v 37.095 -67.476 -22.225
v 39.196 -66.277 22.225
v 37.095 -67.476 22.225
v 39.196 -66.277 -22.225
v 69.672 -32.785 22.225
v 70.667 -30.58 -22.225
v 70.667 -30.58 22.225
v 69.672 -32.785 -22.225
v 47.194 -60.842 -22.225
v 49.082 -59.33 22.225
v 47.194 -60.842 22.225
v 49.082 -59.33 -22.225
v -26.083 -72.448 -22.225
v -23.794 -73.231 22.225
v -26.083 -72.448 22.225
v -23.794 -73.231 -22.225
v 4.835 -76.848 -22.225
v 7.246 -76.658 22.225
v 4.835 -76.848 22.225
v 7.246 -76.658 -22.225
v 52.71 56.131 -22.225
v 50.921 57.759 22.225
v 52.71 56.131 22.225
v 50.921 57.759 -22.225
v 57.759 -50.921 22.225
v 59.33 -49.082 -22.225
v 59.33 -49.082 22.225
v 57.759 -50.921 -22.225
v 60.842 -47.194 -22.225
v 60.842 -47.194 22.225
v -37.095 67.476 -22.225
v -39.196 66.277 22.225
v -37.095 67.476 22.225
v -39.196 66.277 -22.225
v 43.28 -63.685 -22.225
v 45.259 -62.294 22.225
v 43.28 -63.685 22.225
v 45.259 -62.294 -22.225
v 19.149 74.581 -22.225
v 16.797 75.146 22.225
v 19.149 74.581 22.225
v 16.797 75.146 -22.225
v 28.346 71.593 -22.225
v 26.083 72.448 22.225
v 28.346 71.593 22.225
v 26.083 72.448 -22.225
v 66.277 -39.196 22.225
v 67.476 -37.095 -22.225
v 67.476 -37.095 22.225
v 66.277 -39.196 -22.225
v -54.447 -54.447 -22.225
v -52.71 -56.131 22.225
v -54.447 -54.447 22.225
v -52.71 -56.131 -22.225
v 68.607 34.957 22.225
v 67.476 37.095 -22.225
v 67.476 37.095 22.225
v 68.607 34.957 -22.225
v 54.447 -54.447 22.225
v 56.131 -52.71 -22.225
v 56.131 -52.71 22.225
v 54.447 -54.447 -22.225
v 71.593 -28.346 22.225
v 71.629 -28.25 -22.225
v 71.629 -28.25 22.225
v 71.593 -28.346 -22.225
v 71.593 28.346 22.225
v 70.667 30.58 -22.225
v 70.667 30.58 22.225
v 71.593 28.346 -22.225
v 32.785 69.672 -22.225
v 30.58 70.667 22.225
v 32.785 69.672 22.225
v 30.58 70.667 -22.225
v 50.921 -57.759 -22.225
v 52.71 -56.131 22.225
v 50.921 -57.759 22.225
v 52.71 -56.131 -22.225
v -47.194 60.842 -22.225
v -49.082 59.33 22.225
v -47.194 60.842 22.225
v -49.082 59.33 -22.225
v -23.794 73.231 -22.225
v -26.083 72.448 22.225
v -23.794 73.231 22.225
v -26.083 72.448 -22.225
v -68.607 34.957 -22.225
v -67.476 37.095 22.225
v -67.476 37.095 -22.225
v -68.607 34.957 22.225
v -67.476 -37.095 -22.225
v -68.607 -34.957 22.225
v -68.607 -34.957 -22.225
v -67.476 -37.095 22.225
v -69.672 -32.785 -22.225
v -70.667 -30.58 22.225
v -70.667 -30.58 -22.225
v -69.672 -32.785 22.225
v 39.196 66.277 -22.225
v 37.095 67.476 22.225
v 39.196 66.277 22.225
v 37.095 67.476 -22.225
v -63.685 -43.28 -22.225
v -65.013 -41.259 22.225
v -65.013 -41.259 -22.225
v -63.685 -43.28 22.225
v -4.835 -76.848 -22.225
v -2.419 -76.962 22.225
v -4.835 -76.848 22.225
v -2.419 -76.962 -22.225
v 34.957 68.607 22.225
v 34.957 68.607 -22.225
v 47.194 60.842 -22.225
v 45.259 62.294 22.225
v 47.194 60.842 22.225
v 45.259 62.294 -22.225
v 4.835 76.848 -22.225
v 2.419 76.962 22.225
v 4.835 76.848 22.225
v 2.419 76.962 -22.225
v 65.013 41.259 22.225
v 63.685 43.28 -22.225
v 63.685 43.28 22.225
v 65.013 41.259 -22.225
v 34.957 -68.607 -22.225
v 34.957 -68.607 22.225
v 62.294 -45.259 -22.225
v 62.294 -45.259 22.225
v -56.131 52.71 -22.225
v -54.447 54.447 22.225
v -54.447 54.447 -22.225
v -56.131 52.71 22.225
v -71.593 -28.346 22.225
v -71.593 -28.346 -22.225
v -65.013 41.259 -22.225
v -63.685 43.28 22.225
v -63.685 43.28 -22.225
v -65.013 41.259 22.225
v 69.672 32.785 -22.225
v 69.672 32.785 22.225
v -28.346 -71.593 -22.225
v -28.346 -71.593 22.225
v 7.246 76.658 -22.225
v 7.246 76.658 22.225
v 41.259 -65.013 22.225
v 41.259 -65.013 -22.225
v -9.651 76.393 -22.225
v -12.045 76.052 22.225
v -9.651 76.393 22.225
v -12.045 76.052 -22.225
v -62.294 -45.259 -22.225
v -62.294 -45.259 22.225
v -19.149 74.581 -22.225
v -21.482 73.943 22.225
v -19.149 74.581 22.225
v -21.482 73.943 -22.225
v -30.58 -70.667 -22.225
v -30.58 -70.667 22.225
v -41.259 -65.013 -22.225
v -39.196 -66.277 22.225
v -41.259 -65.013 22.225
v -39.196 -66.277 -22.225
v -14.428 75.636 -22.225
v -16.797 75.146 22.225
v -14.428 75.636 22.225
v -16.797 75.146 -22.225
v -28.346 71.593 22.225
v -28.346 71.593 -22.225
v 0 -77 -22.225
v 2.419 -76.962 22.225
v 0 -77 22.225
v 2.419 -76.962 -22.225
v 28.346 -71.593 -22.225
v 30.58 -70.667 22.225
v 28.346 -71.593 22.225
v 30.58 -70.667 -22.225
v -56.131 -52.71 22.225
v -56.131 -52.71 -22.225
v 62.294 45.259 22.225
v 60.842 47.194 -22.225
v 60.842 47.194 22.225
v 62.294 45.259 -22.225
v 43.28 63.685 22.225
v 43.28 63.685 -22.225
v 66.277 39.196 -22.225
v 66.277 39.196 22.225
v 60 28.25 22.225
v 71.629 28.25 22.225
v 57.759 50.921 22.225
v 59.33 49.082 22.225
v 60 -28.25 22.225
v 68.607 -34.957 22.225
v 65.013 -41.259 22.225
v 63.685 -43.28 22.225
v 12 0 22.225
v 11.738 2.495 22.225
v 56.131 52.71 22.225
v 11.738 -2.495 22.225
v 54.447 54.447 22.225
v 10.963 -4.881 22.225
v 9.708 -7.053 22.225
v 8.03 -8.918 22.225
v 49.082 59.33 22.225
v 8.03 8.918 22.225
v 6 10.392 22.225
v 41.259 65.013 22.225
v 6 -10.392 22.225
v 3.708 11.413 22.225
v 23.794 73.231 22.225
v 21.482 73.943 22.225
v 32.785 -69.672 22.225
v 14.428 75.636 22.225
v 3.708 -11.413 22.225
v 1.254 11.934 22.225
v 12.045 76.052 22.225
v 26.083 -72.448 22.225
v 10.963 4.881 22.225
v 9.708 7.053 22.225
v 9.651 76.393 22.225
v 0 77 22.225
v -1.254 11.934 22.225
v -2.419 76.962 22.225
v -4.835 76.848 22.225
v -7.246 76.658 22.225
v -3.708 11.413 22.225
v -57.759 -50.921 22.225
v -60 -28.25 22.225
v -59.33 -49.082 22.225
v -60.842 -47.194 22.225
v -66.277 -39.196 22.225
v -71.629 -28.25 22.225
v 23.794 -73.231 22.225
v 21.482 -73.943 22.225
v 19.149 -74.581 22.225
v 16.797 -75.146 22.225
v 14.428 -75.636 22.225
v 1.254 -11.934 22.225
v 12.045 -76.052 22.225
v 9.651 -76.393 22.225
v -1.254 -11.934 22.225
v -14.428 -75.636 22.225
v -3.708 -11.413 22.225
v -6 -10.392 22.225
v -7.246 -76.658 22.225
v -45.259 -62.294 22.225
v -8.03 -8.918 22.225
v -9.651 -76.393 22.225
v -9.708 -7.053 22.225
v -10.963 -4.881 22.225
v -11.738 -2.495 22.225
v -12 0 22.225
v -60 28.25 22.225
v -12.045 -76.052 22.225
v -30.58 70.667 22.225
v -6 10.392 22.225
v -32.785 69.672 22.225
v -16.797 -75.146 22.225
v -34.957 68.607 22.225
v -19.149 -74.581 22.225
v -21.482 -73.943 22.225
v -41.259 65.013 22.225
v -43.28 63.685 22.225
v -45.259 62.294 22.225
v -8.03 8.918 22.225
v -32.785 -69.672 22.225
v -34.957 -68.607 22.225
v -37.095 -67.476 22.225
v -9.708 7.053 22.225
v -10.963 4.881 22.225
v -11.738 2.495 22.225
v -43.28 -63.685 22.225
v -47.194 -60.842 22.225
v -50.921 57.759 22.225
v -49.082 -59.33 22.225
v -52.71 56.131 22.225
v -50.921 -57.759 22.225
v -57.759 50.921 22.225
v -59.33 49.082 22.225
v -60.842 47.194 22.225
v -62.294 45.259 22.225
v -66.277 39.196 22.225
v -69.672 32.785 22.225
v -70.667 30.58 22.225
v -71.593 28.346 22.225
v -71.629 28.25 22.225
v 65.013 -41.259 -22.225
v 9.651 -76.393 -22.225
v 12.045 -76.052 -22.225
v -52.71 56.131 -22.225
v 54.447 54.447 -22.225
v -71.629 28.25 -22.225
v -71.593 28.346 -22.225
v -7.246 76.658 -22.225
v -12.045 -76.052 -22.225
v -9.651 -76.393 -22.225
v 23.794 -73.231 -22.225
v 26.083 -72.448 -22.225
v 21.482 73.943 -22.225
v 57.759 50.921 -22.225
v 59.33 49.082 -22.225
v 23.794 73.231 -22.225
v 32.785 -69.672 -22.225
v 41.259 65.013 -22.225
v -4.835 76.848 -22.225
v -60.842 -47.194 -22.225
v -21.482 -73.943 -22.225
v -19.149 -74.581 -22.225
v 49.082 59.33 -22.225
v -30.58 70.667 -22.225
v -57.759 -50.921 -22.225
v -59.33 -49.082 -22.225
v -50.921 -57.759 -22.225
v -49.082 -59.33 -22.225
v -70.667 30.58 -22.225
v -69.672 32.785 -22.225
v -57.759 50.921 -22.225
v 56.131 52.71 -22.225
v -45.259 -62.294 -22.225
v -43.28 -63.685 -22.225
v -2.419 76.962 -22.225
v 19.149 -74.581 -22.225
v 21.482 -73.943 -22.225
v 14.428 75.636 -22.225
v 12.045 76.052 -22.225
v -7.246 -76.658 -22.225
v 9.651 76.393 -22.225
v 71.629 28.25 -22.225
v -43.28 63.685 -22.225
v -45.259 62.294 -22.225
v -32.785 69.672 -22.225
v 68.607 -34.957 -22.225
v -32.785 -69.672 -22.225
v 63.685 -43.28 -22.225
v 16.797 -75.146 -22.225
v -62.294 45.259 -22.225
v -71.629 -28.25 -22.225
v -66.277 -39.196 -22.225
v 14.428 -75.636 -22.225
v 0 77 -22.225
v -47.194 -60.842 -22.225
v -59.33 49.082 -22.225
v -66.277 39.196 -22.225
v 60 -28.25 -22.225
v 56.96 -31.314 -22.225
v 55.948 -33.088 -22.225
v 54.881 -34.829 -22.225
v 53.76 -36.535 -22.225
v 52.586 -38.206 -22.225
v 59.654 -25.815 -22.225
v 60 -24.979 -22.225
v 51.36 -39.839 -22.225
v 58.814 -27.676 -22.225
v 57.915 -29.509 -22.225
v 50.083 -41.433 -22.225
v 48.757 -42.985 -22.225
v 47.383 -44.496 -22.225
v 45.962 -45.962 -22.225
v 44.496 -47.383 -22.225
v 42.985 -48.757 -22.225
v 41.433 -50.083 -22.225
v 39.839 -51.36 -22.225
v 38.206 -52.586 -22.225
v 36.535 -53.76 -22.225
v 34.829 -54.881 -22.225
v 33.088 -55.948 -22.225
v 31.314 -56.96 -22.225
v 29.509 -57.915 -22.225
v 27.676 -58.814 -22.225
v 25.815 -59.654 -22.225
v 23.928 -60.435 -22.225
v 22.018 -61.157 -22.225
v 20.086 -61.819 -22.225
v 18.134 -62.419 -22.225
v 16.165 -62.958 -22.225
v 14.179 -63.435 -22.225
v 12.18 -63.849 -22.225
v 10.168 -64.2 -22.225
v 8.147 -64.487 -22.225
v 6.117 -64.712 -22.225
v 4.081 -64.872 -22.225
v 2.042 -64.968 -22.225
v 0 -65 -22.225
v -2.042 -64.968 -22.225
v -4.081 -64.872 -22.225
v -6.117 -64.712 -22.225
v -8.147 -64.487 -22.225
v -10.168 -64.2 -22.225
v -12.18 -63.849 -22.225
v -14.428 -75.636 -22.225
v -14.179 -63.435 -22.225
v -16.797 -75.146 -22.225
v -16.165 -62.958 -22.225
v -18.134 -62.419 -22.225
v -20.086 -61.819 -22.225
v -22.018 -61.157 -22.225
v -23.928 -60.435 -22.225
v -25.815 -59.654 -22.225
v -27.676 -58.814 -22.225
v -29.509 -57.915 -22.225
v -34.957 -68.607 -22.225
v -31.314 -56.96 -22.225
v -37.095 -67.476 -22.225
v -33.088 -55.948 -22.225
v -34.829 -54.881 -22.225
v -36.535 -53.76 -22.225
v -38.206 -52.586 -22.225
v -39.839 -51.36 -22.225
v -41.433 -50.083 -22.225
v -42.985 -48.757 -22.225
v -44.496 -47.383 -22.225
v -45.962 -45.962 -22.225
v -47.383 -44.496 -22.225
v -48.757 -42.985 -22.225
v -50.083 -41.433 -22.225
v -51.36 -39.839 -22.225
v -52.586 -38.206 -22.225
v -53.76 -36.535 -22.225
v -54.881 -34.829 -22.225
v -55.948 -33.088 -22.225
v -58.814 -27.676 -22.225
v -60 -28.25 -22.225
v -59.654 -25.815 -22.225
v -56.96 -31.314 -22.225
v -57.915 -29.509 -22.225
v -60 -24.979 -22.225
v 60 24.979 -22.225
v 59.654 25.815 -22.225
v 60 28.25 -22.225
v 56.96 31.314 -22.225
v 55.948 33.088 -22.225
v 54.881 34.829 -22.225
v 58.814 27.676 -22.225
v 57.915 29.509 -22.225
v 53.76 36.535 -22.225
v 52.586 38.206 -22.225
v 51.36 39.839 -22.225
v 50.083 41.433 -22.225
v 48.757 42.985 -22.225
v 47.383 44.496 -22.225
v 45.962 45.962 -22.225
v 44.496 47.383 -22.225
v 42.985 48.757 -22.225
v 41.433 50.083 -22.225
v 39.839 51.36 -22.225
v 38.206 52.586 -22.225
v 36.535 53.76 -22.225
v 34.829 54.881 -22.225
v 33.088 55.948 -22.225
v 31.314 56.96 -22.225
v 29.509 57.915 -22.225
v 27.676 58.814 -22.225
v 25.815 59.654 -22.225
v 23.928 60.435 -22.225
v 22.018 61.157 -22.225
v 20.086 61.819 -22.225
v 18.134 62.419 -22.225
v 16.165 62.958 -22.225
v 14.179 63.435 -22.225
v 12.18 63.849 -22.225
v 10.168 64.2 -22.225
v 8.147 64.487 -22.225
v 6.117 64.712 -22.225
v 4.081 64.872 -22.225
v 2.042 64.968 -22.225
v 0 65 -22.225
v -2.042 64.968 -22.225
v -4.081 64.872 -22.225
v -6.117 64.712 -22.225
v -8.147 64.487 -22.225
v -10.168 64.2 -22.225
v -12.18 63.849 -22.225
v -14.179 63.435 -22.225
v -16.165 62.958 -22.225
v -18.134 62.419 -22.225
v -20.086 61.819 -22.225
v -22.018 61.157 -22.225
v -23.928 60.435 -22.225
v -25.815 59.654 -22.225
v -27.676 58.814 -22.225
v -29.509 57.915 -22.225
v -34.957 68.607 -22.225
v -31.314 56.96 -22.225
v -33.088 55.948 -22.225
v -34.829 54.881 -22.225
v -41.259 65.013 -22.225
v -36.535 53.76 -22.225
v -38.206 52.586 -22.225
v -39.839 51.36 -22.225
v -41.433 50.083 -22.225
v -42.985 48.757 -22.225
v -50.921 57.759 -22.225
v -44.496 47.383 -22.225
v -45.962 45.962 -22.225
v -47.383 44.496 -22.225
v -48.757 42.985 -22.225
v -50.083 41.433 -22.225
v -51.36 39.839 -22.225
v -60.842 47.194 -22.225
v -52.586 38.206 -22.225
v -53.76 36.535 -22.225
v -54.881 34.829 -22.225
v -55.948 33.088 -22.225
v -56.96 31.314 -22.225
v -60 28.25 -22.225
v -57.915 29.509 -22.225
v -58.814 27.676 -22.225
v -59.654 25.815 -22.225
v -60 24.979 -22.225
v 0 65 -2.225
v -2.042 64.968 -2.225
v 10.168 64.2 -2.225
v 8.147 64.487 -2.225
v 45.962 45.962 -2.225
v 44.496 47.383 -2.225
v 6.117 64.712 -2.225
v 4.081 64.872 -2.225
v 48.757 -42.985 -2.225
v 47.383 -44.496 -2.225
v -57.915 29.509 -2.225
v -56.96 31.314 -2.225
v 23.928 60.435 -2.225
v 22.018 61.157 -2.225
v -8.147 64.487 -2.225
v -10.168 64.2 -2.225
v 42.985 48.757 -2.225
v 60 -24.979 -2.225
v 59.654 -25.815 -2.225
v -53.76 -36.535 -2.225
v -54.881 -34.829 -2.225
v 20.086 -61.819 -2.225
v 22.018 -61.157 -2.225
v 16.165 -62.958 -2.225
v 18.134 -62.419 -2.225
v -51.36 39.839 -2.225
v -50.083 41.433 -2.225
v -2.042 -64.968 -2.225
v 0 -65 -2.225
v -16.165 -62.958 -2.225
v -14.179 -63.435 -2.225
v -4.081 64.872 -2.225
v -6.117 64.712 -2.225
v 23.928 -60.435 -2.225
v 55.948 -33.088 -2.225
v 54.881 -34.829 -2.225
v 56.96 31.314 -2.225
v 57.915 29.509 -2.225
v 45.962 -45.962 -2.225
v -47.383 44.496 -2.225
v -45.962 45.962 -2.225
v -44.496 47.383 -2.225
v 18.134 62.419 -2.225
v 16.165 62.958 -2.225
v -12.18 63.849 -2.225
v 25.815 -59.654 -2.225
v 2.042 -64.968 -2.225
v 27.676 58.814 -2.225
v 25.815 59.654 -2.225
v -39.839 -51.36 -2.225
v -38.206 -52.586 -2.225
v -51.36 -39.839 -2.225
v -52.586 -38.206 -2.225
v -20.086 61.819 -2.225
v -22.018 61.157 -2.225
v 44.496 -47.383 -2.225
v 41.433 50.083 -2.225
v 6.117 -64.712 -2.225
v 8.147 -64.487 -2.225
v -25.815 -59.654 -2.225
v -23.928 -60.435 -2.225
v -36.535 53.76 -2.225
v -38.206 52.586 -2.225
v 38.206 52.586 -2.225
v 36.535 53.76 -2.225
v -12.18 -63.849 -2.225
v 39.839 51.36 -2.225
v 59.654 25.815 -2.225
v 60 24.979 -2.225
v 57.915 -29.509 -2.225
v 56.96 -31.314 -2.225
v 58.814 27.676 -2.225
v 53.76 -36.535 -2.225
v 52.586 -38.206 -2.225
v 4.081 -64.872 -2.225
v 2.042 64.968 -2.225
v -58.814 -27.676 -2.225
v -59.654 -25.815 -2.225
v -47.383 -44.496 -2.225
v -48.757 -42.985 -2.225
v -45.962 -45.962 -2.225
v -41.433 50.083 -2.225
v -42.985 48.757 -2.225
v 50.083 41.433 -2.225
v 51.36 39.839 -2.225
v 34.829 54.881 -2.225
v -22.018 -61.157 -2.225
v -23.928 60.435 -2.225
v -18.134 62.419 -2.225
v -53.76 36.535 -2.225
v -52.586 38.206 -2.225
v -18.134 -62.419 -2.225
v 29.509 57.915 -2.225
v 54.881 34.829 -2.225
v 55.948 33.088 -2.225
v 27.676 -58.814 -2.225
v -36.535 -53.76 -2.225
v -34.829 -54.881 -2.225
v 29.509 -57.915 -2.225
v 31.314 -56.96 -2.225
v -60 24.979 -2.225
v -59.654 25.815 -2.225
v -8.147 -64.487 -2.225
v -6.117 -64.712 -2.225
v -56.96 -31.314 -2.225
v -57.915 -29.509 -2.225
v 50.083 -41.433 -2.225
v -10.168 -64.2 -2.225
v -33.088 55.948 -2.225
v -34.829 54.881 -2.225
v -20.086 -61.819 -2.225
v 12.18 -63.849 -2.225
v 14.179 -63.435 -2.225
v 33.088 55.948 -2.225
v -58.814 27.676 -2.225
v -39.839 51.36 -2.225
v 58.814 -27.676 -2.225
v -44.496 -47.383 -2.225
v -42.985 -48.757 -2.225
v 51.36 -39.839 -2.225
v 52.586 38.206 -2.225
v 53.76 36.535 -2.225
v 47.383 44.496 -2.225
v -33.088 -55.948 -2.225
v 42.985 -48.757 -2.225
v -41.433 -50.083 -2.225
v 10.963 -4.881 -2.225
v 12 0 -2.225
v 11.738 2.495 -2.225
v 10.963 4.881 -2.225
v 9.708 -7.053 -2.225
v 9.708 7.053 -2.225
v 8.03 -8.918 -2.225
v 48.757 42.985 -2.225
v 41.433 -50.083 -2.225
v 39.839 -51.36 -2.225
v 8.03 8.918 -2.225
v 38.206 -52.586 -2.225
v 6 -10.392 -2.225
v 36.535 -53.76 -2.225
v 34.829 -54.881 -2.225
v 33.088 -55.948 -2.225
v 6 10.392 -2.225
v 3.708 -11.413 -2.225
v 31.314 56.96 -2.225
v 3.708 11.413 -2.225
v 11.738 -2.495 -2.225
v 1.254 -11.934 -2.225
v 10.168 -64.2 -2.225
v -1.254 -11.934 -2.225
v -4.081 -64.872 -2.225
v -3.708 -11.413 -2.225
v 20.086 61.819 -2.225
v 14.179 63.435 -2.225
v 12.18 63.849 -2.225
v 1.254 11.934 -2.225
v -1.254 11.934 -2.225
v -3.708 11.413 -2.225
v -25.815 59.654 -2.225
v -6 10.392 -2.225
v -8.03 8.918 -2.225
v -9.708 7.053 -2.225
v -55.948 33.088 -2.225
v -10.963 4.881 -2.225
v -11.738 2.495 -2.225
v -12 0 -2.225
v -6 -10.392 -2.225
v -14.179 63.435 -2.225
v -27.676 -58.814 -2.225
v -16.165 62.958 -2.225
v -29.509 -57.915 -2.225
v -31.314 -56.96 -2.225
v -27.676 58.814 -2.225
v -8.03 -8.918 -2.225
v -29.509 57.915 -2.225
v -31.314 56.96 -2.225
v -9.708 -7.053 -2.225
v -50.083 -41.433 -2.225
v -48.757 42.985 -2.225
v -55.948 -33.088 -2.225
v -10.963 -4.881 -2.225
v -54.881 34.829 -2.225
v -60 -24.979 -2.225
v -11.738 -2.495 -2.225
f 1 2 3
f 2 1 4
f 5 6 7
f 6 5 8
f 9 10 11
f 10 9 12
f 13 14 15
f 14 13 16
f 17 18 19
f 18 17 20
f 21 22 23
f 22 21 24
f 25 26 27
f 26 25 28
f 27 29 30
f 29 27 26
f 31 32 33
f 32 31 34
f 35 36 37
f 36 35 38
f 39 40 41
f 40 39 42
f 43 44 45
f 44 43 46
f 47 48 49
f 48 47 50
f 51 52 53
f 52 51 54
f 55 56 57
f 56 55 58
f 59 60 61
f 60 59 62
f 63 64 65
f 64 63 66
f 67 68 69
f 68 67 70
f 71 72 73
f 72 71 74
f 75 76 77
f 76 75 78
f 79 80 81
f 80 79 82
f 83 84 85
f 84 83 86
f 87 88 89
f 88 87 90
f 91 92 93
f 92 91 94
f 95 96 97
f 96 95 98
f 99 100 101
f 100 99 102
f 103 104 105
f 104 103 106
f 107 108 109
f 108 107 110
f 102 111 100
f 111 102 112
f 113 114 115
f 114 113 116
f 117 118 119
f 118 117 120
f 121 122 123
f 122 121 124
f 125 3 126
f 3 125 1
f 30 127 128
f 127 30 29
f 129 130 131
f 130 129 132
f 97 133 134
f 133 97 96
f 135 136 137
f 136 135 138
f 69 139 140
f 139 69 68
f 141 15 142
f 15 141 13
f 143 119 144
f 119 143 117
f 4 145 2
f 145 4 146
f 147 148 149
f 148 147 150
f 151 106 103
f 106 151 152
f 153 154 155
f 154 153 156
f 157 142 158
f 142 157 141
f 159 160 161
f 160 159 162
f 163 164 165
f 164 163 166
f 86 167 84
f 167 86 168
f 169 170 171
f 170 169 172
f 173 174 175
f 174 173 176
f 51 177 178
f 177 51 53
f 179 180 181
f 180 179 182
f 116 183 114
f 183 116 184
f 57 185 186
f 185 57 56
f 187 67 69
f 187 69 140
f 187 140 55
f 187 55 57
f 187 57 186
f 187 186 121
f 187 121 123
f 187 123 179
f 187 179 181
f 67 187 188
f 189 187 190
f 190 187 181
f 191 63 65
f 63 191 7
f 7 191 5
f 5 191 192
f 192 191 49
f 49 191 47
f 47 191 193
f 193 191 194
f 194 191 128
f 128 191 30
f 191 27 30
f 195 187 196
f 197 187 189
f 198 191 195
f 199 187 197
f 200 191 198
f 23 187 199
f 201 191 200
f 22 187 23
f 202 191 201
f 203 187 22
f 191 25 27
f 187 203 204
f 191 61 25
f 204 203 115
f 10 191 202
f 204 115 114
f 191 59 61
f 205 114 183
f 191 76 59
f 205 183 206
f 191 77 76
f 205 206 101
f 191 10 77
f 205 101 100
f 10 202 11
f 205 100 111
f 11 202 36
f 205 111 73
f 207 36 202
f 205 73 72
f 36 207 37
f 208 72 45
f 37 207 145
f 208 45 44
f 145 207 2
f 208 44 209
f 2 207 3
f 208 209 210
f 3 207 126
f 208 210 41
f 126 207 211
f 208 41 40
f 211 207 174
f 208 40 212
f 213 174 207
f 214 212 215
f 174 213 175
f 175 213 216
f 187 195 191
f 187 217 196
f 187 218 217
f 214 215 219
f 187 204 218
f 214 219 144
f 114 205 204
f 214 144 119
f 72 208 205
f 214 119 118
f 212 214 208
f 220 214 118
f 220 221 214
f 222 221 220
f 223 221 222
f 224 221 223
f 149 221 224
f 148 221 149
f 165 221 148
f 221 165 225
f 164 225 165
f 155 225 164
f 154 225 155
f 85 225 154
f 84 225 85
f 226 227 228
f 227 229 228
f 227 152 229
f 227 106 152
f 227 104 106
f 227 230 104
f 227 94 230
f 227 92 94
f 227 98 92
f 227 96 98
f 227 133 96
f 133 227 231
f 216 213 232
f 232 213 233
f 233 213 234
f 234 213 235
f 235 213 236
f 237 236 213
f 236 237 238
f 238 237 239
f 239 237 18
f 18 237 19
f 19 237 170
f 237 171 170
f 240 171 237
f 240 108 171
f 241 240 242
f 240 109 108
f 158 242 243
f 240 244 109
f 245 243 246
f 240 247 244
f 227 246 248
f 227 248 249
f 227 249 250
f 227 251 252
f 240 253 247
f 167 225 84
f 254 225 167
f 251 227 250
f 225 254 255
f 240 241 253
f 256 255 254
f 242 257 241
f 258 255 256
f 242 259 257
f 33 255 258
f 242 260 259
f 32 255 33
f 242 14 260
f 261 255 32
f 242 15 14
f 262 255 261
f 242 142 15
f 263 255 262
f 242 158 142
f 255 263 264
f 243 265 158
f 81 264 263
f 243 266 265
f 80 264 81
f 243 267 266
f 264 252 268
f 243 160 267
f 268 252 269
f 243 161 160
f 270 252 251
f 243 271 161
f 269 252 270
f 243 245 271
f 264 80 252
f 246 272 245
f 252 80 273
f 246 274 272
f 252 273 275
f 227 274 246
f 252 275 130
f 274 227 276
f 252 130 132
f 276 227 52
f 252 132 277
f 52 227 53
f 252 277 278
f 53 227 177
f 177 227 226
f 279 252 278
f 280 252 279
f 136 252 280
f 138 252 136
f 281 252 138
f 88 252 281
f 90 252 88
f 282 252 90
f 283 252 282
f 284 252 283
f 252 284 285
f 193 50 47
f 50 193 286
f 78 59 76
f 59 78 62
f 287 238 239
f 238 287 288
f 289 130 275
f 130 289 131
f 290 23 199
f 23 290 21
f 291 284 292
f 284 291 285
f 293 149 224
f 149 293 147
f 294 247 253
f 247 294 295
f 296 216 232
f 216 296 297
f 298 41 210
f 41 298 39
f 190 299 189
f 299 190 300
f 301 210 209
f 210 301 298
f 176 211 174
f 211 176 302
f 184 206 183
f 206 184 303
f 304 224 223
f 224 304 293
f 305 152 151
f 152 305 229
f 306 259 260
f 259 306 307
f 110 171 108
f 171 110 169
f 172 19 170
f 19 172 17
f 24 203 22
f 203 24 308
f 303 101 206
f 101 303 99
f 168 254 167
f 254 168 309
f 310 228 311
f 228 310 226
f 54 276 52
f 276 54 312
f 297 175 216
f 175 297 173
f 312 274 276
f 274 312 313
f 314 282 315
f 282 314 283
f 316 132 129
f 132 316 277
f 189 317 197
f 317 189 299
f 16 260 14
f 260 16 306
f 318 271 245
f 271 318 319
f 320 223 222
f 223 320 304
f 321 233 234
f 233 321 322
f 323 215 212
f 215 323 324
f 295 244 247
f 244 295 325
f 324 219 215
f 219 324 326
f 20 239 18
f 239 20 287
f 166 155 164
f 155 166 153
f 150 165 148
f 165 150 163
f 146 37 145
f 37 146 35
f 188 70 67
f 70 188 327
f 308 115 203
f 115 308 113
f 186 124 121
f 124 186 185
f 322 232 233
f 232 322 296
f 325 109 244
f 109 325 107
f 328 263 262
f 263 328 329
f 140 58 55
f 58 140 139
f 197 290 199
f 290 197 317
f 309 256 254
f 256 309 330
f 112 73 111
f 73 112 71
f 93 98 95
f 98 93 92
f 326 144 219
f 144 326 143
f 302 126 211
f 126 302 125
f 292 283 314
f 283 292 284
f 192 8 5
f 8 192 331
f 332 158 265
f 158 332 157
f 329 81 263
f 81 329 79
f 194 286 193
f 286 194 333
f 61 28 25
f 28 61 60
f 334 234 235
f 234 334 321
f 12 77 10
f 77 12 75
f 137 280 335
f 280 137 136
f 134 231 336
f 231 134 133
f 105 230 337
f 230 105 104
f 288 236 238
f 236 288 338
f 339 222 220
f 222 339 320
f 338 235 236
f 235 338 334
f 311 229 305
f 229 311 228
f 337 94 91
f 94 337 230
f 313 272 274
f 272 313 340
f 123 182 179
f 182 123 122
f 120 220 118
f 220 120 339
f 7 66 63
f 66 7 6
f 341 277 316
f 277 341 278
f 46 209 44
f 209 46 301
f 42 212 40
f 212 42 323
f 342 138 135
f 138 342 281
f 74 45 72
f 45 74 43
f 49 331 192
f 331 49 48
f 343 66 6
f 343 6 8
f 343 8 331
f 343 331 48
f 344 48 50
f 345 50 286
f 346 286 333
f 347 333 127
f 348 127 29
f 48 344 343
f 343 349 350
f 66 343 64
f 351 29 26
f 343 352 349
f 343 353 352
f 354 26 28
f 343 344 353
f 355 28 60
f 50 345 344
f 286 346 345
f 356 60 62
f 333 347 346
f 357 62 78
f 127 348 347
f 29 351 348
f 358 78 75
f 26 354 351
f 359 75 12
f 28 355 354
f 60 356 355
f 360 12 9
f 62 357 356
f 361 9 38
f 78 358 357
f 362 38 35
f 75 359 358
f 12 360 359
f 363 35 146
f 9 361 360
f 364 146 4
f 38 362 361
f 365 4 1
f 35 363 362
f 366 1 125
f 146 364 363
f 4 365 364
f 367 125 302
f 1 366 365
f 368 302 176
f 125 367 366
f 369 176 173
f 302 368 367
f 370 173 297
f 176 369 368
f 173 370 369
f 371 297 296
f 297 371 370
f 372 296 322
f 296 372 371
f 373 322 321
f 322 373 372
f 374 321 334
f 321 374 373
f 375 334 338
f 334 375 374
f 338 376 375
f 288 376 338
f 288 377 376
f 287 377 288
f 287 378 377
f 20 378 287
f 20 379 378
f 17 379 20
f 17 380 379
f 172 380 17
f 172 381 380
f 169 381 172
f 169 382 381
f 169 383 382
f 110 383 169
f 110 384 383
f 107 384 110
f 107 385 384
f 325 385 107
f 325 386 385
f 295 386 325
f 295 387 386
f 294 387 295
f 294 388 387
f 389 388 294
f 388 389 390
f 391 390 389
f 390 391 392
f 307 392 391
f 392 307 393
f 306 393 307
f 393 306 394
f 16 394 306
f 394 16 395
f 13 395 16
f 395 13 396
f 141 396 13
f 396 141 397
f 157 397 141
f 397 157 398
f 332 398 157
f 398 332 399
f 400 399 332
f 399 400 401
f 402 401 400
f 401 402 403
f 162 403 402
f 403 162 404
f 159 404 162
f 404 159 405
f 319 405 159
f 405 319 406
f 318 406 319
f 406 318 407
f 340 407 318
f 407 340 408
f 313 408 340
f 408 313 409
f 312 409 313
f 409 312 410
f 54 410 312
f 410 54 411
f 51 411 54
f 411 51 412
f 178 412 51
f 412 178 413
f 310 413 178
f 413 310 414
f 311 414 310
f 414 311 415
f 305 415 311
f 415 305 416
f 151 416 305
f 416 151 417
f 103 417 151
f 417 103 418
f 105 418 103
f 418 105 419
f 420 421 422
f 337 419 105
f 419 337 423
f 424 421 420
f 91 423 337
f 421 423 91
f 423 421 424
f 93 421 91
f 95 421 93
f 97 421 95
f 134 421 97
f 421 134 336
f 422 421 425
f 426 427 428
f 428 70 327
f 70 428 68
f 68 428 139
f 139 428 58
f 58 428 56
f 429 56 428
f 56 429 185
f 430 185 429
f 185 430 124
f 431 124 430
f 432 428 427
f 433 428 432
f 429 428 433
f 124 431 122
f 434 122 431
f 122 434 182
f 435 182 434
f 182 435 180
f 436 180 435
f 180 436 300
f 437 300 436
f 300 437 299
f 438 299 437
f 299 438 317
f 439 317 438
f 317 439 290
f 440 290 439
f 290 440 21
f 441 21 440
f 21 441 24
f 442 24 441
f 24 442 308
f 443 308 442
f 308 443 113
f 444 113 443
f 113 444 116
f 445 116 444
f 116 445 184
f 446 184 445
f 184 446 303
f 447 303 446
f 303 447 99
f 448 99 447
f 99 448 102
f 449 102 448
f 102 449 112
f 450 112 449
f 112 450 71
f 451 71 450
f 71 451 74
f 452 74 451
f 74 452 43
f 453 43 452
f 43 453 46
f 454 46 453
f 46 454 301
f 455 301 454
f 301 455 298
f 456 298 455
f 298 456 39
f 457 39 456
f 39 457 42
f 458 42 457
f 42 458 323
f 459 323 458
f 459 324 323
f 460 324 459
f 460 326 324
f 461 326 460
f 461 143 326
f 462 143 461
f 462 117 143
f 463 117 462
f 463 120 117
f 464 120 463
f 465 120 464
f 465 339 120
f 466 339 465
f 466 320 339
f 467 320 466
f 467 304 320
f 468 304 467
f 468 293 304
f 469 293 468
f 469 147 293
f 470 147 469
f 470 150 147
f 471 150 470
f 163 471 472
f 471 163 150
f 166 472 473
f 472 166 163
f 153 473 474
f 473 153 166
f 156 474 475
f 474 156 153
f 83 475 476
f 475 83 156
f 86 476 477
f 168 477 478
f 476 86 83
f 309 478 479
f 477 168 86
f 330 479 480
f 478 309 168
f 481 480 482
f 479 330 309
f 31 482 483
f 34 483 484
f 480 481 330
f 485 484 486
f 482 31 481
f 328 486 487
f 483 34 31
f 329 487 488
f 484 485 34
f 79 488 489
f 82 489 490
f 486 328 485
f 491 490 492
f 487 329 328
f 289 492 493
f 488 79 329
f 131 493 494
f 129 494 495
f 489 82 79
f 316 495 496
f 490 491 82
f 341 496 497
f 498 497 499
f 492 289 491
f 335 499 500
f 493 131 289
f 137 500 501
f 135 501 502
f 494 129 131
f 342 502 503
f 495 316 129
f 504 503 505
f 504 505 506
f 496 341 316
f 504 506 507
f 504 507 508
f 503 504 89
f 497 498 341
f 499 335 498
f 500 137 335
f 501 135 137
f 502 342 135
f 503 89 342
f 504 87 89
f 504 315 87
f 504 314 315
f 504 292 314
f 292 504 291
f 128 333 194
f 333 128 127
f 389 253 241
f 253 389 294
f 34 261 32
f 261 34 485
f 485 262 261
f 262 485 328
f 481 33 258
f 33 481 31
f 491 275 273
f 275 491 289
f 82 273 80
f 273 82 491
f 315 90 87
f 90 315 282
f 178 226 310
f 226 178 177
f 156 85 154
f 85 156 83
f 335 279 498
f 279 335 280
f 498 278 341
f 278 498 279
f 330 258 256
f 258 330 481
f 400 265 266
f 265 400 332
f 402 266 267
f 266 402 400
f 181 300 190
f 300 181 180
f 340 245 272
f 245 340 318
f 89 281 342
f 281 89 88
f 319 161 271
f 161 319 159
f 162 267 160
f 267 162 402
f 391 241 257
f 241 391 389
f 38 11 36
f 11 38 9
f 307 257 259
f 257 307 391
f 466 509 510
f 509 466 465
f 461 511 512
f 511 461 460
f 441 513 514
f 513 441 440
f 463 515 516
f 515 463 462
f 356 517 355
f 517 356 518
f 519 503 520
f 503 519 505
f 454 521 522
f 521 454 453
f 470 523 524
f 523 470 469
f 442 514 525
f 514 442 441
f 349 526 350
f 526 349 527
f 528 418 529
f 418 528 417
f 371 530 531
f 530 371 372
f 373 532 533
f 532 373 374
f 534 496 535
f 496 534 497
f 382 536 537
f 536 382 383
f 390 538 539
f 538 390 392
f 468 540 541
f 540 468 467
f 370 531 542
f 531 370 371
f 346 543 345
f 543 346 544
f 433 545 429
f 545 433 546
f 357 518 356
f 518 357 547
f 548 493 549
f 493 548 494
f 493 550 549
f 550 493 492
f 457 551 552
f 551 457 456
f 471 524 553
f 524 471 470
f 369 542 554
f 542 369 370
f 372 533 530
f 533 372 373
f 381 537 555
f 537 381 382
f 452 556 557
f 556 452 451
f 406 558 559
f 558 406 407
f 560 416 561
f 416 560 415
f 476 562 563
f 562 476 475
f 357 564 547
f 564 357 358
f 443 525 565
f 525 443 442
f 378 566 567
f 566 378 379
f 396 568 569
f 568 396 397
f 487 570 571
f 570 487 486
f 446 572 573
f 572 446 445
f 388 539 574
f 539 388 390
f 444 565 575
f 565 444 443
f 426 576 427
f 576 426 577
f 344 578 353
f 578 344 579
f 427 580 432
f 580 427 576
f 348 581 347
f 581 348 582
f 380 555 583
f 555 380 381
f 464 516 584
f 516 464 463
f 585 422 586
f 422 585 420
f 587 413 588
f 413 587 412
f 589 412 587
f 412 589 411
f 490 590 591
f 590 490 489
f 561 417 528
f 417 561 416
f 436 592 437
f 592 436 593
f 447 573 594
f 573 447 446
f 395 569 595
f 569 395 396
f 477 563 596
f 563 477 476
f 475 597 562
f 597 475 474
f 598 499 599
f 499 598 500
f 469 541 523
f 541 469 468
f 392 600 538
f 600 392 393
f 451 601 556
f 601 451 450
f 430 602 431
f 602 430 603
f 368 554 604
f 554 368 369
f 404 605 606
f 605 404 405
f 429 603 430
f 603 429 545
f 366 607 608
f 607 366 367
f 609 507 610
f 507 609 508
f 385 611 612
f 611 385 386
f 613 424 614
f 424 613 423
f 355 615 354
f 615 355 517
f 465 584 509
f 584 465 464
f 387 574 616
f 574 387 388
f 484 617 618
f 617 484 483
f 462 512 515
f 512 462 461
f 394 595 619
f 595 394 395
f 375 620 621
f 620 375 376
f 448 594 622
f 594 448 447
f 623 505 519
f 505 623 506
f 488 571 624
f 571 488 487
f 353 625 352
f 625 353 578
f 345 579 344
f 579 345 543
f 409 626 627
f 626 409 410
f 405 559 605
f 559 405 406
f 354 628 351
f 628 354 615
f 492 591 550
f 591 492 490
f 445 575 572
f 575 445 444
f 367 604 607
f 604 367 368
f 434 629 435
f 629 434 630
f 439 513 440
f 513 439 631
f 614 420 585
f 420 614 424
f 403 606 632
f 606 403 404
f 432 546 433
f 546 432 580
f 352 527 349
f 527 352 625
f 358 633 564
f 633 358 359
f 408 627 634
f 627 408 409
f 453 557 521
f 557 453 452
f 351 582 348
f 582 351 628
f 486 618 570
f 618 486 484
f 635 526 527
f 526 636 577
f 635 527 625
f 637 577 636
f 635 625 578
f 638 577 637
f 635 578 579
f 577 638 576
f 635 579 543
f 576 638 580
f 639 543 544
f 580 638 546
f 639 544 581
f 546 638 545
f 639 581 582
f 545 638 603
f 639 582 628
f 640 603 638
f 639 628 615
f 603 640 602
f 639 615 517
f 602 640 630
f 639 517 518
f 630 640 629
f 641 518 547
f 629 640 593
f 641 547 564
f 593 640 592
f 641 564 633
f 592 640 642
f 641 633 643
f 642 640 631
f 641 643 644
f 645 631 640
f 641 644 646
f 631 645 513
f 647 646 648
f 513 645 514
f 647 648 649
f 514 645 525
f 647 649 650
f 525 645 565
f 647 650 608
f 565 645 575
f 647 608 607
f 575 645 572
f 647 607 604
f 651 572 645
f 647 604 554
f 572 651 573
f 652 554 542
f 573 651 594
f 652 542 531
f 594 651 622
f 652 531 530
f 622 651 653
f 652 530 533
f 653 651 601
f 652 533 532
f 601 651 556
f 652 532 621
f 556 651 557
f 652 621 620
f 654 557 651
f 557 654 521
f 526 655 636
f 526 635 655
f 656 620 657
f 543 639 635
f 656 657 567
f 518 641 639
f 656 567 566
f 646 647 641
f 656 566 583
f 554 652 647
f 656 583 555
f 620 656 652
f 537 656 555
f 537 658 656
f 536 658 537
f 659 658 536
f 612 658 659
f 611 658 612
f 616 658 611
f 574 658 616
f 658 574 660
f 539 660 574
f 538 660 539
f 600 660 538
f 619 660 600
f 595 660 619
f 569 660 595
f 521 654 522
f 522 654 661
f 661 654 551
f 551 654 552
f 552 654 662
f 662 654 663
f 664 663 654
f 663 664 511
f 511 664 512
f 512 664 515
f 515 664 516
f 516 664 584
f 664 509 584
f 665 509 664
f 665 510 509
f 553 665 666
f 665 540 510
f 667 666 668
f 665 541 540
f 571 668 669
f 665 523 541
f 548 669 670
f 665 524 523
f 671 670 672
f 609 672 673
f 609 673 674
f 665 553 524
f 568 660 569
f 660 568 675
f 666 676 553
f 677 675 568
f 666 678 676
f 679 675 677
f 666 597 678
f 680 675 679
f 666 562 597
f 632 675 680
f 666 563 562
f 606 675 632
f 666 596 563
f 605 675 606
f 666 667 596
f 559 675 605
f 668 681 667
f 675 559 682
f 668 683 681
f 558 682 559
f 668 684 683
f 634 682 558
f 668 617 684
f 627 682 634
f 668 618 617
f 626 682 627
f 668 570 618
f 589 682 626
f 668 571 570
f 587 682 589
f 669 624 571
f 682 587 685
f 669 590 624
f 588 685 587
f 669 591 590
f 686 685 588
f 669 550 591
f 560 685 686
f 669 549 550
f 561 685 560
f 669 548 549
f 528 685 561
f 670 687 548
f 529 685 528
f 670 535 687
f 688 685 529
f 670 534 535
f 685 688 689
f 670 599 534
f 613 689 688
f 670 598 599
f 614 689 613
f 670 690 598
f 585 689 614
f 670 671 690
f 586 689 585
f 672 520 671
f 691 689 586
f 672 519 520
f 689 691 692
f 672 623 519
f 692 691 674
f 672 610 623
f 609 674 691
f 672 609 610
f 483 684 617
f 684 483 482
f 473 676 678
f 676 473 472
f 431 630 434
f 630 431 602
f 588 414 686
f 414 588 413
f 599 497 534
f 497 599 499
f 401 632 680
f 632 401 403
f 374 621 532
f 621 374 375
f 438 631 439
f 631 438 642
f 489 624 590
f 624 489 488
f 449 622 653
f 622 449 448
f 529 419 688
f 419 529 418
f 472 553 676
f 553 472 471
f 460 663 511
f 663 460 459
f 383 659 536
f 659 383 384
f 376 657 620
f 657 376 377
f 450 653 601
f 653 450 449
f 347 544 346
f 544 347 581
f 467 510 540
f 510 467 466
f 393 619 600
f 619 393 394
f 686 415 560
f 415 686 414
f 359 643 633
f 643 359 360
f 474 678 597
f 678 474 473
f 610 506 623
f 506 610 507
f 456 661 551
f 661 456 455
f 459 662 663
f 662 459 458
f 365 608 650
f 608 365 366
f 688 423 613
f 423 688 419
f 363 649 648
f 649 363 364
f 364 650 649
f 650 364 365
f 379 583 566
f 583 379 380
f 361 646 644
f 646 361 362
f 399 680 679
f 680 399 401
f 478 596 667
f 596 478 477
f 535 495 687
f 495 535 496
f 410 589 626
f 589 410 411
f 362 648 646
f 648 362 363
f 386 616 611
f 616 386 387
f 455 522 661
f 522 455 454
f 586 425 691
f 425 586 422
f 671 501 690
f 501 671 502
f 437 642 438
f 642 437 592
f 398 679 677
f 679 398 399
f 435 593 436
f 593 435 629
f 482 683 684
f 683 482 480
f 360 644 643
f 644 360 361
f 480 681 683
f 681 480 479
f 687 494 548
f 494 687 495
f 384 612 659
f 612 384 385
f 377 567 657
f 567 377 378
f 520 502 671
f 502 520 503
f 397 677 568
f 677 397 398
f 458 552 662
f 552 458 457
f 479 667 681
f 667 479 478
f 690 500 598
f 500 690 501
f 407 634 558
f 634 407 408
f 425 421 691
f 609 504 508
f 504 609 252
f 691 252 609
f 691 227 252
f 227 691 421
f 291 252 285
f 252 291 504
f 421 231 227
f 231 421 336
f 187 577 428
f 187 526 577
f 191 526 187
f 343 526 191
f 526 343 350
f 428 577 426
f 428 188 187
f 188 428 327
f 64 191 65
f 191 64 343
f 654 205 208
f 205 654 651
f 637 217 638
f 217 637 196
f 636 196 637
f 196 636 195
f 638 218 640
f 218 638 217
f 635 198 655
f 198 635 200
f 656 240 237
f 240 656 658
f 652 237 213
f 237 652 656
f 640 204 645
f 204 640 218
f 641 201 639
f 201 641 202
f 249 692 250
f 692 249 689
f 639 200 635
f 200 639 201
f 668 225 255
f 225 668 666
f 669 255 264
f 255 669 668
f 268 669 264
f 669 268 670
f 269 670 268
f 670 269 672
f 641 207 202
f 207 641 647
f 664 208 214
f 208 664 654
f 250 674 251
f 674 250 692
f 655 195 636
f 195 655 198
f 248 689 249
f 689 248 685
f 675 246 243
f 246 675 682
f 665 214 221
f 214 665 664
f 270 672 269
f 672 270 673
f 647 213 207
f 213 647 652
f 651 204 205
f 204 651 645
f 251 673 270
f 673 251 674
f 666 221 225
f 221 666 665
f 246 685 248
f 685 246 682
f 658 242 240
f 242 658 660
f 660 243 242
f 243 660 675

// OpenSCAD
//main body
difference(){
    cylinder(r = 77, h = 44.45, $fn = 200, center = true);
    //cylinder(44.45,77,77,true);
    difference(){
    //big center hole
    translate([0, 0, -24.45])
    cylinder(r=65, h=44.45, $fn = 200, center = true);

    }
     //wheel wells L
    translate([-103, -28.25, -45.675])
    cube([43,56.5,100], false);
    //wheel wells R
    translate([60, -28.25, -45.675])
    cube([43,56.5,100], false);
    /* square hole in middle
    translate([0,0,-22.225])
        cube([101.6,101.6,44.45], true);
    //square extension L
    translate([-60, -25, -44.45])
    cube([55,50,50], false);
    //square extension R
    translate([5, -25, -44.45])
        cube([55,50,50], false);
    /*space for motor cord right
    translate([5, -20, -44.45])
        cube([5,40, 88.9], false);
    //space for motor cord left
    translate([-10, -20, -44.45])
        cube([5,40, 88.9], false);*/
    //another hole in the middle
    //cube([70,50,45], true);
    /*hole 1 in corner
    translate([-38, -38, 0])
        cylinder(500, 12, 12, true);
    //hole 2 in corner
    translate([-38, 38, 0])
        cylinder(500, 12, 12, true);
    //hole 3 in corner
    translate([38, -38, 0])
        cylinder(500, 12, 12, true);
    //hole 4 in corner
    translate([38, 38, 0])
        cylinder(500, 12, 12, true);*/
    //hole in center
    translate([0, 0, 0])
        cylinder(500, 12, 12, true);
}
